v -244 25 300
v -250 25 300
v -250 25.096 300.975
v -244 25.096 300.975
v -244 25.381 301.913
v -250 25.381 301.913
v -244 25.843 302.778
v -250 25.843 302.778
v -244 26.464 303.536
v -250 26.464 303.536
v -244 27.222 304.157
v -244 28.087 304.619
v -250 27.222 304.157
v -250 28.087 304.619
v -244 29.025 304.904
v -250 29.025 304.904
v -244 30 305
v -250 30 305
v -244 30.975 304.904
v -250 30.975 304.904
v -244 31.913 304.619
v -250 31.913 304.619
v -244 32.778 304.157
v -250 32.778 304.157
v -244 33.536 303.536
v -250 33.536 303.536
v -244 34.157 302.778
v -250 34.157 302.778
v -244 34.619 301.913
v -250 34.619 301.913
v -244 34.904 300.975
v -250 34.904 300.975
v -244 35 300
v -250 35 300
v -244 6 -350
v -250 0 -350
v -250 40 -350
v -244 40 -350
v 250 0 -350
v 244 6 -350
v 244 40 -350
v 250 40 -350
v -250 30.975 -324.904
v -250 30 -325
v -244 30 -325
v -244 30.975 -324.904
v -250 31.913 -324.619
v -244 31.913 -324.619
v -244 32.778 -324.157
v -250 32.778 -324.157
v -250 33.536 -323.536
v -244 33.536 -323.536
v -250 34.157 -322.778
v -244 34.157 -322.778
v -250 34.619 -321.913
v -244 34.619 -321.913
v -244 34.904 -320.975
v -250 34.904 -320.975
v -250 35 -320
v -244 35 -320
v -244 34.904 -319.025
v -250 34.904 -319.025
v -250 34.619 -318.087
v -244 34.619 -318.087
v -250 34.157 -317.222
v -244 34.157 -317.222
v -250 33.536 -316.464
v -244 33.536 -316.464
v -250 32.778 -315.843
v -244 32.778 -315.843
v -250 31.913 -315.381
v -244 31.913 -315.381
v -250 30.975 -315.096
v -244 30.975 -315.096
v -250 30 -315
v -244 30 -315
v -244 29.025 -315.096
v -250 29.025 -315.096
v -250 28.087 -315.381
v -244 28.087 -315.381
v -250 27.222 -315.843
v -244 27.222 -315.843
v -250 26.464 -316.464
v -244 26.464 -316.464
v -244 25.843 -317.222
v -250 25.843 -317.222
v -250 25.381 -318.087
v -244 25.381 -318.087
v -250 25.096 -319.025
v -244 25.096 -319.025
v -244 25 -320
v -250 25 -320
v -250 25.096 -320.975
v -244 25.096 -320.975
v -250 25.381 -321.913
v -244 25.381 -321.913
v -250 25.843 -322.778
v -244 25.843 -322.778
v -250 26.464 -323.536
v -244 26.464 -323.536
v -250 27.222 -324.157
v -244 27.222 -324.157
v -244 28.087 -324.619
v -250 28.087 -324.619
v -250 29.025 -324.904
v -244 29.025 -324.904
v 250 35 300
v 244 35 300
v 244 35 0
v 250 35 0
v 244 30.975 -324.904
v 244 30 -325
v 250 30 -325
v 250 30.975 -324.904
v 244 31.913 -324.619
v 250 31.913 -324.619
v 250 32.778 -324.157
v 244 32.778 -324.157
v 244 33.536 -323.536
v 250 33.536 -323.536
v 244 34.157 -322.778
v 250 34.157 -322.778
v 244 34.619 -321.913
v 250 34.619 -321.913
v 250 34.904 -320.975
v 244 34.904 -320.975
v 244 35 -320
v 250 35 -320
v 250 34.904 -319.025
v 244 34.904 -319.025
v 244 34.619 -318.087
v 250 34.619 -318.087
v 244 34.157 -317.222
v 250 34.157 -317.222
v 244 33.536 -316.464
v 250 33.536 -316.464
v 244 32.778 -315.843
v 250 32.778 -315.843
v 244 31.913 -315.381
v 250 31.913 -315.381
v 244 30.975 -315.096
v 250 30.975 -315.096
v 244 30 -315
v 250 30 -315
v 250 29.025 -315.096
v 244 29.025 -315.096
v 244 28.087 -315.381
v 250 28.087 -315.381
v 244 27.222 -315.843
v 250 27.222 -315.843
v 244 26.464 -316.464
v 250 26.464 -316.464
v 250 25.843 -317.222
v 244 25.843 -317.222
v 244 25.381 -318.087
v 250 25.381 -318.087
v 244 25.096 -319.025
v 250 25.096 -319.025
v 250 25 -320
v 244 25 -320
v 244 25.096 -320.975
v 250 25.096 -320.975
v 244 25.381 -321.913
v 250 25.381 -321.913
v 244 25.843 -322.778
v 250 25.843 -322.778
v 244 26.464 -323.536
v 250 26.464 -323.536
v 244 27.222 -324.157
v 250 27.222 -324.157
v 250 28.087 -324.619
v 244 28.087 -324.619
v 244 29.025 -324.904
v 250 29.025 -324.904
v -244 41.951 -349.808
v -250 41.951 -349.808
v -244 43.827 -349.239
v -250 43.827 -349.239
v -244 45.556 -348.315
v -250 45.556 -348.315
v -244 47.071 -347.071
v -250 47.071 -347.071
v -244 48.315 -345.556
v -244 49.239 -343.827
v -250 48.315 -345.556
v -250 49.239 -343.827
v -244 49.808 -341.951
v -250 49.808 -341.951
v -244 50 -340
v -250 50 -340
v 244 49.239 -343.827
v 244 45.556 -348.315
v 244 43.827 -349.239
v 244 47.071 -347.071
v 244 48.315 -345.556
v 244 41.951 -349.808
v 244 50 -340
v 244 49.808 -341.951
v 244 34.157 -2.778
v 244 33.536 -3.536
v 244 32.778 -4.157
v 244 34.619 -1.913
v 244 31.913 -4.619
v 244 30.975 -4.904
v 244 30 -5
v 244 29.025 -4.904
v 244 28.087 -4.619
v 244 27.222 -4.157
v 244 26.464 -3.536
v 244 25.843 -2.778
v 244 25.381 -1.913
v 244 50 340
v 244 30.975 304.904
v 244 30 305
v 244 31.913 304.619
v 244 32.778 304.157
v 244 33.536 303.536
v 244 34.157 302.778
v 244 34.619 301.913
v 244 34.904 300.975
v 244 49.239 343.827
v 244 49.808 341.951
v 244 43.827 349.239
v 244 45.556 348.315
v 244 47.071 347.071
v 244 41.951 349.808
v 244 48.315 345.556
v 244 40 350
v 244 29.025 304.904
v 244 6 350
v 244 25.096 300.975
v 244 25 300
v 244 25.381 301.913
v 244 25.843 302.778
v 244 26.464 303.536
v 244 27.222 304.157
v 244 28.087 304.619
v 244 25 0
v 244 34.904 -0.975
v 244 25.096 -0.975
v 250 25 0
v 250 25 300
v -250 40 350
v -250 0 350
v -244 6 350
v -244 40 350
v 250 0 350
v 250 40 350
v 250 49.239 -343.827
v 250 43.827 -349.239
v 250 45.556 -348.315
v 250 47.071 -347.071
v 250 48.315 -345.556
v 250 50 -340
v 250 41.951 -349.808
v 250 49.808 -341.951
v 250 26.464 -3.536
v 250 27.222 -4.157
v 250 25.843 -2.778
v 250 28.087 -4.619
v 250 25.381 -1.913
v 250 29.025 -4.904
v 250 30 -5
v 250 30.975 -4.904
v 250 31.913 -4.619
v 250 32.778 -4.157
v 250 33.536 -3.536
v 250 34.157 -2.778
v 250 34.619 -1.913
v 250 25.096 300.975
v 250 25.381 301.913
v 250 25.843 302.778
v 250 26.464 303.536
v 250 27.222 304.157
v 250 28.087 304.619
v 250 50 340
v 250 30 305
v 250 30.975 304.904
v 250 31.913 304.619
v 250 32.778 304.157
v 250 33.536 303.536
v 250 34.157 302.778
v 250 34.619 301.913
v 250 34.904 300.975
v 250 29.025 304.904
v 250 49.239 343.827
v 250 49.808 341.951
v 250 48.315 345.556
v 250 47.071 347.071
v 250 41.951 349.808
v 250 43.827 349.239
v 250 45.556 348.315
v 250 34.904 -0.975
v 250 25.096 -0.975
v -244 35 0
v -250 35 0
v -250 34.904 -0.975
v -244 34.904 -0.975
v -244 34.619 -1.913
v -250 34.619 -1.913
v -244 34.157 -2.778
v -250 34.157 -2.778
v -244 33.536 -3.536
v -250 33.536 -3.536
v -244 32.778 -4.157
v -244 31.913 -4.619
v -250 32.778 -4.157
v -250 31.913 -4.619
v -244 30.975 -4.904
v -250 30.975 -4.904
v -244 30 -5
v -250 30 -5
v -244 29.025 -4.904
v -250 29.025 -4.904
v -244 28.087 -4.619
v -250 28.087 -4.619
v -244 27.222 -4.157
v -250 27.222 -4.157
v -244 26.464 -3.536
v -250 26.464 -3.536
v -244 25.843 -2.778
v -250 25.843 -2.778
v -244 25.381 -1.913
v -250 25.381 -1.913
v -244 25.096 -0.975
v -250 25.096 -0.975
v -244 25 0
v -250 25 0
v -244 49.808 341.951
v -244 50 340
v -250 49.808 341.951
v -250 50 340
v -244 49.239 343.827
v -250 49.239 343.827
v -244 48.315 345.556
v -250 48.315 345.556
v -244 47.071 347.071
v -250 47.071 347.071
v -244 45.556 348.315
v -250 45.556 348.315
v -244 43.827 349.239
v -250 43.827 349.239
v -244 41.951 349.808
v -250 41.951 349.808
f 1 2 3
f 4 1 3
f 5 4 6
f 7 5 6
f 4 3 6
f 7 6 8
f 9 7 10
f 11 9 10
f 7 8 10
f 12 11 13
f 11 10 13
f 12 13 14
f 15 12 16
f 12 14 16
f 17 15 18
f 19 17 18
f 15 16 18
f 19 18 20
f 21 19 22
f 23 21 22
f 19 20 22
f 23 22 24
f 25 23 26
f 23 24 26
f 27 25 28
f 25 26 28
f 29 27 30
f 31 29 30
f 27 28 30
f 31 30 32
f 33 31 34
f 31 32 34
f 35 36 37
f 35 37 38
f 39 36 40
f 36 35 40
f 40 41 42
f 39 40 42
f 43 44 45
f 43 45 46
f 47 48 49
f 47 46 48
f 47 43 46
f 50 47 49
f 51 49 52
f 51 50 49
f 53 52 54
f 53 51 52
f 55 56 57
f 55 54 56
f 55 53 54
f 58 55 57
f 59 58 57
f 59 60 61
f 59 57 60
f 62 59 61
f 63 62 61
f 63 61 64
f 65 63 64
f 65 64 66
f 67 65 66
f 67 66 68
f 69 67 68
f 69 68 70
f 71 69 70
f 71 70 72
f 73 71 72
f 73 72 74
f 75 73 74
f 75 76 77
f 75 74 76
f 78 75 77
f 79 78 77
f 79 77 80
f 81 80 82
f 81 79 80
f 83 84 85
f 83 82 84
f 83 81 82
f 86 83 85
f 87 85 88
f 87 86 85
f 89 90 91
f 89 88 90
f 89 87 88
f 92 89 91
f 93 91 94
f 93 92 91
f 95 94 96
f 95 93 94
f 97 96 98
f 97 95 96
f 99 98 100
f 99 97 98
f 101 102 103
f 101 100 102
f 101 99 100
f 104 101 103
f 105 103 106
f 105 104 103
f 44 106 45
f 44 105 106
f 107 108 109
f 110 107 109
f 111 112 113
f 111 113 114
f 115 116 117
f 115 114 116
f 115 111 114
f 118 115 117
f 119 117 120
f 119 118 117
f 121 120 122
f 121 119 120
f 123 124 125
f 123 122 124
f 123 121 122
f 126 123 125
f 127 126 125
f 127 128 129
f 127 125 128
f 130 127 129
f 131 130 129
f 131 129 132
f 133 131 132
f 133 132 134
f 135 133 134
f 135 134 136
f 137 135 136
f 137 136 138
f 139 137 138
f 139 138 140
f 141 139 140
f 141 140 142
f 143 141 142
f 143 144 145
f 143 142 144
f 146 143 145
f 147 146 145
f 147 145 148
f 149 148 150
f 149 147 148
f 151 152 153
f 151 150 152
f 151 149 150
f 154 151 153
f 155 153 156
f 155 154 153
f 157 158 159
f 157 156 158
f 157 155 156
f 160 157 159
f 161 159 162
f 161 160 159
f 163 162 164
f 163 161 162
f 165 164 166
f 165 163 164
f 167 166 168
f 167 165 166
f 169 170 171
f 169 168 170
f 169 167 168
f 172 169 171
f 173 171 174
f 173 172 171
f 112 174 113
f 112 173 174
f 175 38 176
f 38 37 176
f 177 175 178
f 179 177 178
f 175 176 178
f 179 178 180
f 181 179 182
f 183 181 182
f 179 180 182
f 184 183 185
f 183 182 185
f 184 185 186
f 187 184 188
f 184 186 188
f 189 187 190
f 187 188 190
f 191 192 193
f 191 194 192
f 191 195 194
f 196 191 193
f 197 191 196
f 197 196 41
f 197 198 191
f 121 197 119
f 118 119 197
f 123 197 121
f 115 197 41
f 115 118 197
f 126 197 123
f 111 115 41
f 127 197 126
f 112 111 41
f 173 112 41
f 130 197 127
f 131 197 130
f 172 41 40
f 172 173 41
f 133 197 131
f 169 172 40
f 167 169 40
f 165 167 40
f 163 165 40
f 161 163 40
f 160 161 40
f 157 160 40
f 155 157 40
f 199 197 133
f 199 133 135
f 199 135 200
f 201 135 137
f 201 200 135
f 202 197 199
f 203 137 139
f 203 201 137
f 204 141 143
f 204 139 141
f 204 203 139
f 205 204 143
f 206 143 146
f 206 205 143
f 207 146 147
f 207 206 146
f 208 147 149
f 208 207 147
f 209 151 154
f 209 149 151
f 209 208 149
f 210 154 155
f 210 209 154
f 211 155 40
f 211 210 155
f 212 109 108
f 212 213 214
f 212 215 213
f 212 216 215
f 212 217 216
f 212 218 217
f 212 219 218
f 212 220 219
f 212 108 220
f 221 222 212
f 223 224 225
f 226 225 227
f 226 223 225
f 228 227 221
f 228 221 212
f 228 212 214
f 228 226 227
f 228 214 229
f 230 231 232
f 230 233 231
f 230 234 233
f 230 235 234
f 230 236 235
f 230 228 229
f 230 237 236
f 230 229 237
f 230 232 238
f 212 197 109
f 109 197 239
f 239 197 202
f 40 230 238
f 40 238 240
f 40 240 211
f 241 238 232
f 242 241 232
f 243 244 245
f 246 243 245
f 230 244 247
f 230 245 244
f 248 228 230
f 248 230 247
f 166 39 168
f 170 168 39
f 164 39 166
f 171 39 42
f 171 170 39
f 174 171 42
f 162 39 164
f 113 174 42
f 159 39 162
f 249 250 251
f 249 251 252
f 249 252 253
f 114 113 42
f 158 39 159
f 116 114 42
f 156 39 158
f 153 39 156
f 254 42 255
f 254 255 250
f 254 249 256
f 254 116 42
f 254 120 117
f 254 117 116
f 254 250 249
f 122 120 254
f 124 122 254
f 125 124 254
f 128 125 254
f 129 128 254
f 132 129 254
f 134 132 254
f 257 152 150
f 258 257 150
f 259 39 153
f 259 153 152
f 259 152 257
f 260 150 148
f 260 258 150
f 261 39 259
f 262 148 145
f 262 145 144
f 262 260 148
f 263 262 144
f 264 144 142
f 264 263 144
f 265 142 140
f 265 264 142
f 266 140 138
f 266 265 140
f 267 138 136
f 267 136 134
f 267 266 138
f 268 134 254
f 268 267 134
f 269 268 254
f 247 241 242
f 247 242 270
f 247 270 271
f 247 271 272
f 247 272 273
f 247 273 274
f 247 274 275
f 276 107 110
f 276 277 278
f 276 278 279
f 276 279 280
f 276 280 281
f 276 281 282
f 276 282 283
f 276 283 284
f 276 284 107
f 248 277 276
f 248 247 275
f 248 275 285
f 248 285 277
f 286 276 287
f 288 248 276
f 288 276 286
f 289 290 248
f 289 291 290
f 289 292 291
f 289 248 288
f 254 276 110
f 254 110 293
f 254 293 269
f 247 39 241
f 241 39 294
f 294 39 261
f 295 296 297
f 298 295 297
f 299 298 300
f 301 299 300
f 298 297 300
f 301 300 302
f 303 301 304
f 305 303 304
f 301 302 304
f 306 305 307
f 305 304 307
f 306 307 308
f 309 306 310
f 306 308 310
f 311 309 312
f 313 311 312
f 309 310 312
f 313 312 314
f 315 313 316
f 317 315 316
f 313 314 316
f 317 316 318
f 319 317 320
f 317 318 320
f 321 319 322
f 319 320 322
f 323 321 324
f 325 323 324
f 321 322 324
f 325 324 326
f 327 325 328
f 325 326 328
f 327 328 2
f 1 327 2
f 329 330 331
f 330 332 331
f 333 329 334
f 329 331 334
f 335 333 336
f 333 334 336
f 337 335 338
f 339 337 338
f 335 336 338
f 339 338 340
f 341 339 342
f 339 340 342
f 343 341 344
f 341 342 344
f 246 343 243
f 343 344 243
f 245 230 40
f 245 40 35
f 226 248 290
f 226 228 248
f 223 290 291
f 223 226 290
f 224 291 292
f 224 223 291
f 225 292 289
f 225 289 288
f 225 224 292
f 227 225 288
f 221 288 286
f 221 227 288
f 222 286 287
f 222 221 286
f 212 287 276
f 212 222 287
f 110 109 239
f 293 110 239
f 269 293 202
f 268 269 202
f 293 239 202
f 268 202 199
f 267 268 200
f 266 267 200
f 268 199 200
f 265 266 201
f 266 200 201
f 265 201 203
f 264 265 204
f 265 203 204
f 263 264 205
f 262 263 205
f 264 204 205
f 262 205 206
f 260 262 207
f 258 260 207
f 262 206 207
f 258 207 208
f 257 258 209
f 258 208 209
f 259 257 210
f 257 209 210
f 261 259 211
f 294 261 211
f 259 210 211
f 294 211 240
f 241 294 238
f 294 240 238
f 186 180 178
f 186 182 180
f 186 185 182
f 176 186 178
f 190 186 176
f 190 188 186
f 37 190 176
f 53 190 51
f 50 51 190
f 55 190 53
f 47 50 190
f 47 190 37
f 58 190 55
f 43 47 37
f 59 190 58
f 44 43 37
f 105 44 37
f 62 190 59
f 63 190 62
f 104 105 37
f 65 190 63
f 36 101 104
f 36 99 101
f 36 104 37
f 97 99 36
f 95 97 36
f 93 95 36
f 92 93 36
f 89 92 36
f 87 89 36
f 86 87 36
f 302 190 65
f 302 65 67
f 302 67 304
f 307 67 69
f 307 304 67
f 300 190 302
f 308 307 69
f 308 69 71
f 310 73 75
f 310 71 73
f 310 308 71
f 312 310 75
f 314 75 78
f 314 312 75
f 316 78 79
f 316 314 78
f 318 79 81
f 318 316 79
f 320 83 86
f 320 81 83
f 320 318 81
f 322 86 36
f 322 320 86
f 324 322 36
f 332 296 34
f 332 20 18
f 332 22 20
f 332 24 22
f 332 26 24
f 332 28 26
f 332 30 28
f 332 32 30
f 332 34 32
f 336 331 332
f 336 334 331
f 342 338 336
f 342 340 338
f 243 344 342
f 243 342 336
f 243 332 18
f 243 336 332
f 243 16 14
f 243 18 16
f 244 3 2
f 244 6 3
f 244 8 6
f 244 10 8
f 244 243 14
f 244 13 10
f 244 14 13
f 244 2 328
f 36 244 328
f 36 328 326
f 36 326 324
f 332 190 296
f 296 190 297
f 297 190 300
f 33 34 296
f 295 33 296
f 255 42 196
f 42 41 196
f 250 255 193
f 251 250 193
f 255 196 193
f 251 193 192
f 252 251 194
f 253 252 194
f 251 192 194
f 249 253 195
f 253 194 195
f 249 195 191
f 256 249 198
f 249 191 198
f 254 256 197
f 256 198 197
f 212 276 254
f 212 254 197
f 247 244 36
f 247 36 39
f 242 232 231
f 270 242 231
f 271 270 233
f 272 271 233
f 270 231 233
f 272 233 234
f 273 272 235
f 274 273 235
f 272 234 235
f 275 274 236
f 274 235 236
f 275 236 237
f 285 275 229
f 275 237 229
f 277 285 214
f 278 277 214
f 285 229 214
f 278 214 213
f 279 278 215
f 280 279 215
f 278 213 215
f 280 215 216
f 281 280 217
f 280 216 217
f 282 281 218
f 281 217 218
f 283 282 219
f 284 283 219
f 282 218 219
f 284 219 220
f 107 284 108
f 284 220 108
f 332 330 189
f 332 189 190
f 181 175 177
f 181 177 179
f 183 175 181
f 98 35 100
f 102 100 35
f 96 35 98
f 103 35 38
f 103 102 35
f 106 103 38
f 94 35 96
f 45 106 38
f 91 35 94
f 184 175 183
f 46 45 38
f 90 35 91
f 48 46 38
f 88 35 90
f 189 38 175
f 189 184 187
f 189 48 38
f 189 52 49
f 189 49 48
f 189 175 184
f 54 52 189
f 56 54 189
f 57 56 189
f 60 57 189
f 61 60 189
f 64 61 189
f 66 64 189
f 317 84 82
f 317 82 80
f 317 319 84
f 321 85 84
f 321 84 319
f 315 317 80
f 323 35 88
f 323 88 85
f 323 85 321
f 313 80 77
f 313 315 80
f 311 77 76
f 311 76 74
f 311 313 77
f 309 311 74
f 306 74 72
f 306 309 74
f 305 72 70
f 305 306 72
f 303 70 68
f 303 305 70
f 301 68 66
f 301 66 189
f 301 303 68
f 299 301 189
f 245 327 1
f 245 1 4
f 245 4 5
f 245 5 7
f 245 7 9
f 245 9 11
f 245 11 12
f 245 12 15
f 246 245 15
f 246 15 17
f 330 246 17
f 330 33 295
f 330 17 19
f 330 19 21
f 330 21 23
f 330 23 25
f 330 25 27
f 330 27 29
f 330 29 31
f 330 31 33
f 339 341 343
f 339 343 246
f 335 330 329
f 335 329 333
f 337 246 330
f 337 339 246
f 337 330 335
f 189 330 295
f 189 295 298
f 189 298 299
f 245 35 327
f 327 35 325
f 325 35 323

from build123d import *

# Parameters (mm, degrees)
EXTRUDE_THIN1_DEPTH     = 350
CUT_EXTRUDE1_DEPTH      = 613.372435696
CUT_EXTRUDE1_DEPTH_BACK = 613.372435696
SKETCH2_R               = 5
FILLET1_R               = 10


with BuildPart() as part:
    # Sketch1 → Extrude-Thin1 (new, symmetric)
    with BuildSketch(Plane.XY):
        Polygon((-250, 50), (-250, 0), (250, 0), (250, 50), (244, 50), (244, 6), (-244, 6), (-244, 50), align=None)
    extrude(amount=EXTRUDE_THIN1_DEPTH, both=True)

    # Sketch2 → Cut-Extrude1 (cut, two sides: drawn at the far end of the back side and taken through both)
    with BuildSketch(Plane(origin=(250, 0, 0), x_dir=(0, 0, -1), z_dir=(1, 0, 0)).offset(-CUT_EXTRUDE1_DEPTH_BACK)):
        with Locations((320, 30)):
            Circle(SKETCH2_R)
        with BuildLine():
            Line((-300, 35), (0, 35))
            ThreePointArc((0, 35), (5, 30), (0, 25))
            Line((0, 25), (-300, 25))
            ThreePointArc((-300, 25), (-305, 30), (-300, 35))
        make_face()
    extrude(amount=CUT_EXTRUDE1_DEPTH + CUT_EXTRUDE1_DEPTH_BACK, mode=Mode.SUBTRACT)

    # Fillet1
    fillet1_edges = [part.edges().sort_by_distance(p)[0] for p in [
        (247, 50, 350),
        (247, 50, -350),
        (-247, 50, 350),
        (-247, 50, -350),
    ]]
    fillet(fillet1_edges, radius=FILLET1_R)


solid = part.part
